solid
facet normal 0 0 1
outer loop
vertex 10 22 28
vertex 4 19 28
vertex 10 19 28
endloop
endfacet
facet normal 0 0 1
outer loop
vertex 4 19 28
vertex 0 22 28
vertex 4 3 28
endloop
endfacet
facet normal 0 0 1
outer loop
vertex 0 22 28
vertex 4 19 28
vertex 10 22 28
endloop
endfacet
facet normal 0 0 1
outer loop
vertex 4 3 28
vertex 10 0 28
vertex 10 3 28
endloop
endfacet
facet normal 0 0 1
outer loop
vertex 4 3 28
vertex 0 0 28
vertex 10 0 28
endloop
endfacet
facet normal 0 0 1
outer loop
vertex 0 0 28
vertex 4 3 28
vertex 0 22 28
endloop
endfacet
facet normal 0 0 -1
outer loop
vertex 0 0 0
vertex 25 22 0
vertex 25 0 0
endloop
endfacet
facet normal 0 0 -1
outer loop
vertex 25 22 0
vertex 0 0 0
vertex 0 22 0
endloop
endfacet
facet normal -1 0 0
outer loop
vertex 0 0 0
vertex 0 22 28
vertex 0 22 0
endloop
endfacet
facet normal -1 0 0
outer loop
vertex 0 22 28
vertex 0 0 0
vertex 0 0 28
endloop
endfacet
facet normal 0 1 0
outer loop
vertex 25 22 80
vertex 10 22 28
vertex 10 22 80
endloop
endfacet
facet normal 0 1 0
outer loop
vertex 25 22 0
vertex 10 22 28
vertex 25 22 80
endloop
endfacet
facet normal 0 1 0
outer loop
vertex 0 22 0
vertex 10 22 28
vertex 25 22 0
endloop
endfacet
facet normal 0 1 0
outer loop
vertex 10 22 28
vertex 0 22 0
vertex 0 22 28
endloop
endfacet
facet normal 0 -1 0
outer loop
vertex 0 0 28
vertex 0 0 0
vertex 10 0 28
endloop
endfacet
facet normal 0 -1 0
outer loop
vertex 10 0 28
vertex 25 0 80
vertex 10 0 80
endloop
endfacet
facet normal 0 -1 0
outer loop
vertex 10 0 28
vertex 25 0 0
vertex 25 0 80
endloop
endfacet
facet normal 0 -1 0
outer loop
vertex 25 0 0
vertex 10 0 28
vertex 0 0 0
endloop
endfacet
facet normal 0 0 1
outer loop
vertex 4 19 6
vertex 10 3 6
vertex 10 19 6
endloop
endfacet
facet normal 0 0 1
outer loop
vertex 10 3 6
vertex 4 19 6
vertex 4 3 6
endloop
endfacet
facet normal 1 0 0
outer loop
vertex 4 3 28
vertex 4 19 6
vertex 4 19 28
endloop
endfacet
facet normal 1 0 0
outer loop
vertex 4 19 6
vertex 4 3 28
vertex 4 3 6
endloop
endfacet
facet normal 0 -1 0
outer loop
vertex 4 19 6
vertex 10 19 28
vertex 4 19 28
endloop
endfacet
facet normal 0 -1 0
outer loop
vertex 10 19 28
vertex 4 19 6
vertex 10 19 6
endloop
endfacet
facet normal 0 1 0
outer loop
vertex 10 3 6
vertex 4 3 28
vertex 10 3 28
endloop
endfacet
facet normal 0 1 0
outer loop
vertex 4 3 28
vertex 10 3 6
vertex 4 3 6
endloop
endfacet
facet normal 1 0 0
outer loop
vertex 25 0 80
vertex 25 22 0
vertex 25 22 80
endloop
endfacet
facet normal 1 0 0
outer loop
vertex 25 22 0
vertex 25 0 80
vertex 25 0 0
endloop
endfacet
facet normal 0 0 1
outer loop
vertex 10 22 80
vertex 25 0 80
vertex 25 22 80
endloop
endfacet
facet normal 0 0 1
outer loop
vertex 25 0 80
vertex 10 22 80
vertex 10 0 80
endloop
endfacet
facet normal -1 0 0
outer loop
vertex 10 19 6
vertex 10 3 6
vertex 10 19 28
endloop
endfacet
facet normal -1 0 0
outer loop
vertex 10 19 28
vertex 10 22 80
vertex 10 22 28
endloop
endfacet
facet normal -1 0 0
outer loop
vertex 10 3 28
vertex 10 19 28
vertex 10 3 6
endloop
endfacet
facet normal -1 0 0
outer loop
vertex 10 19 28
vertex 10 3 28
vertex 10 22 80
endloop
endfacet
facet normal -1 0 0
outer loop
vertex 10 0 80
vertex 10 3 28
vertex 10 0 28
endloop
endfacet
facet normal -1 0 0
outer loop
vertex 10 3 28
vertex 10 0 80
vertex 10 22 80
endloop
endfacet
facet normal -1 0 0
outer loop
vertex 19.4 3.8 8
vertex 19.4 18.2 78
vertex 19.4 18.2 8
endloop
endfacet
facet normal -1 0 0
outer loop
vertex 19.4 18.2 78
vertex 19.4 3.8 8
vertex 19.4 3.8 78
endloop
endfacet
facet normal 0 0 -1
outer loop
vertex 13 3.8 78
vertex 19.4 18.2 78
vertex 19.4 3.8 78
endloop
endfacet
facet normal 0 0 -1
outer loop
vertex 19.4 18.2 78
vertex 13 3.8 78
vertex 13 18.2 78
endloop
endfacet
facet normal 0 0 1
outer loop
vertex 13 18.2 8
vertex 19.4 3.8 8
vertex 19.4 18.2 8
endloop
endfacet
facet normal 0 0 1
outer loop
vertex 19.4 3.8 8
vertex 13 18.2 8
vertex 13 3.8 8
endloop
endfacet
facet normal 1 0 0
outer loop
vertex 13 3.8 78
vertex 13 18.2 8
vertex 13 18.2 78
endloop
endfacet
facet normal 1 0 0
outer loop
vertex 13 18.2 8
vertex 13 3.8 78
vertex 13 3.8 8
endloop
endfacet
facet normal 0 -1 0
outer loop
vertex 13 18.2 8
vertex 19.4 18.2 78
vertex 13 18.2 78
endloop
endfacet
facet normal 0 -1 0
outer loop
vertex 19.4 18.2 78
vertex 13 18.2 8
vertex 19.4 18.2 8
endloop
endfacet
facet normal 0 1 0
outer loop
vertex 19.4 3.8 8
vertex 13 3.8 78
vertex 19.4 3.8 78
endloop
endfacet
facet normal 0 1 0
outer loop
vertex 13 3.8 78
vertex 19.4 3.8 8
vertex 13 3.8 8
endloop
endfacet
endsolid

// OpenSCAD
// file: ../params/mvp_params.scad
// ===================================
// OpenGarden MVP Parameters
// Mechanical Step 3
// Carrier + Insert architecture
// ===================================

// ---------- Pot Insert ----------
insert_top_width        = 168;
insert_top_depth        = 168;
insert_bottom_width     = 144;
insert_bottom_depth     = 144;
insert_height           = 145;

insert_wall_thickness   = 2.4;
insert_bottom_thickness = 3.0;

// Top seating flange
insert_flange_width     = 6;
insert_flange_thickness = 3;

// Real-world fit / tolerance
insert_clearance_xy     = 0.8;   // total opening clearance target
insert_fit_clearance    = 0.4;   // applied to insert outer size to avoid coincident geometry
insert_seat_drop_z      = 0.6;   // seat ledge slightly below flange bottom to avoid coplanar faces

// Drainage
drain_hole_diameter     = 8;
drain_hole_offset_x     = 28;
drain_hole_offset_y     = 0;

// Carrier
carrier_outer_width     = 196;   // 7 x 28
carrier_outer_depth     = 196;   // 7 x 28
carrier_height          = 168;   // 6 x 28

carrier_wall_thickness  = 4;
carrier_back_thickness  = 5;
carrier_ledge_width     = 8;
carrier_ledge_height    = 5;

// Sensor
sensor_probe_width      = 14;
sensor_probe_thickness  = 6;
sensor_probe_length     = 70;

sensor_holder_width     = 22;
sensor_holder_thickness = 3;
sensor_holder_height    = 28;
sensor_insert_depth     = 60;

// Tube
tube_outer_diameter     = 6.0;
tube_clip_wall          = 2.4;
tube_clip_width         = 16;
tube_drop_inset         = 18;

// Electronics
electronics_plate_width  = 110;
electronics_plate_height = 140;
electronics_plate_thick  = 4;

// General print
clearance_loose         = 0.4;
clearance_tight         = 0.2;

$fn = 48;
// main file
include <../params/mvp_params.scad>

// ===================================
// Sensor Holder
// Clip-on insert flange holder
// ===================================

module sensor_channel() {
    cube([
        sensor_probe_thickness + clearance_loose,
        sensor_probe_width + clearance_loose,
        sensor_probe_length
    ], center = false);
}

module flange_clip_body() {
    difference() {
        cube([16, sensor_holder_width, sensor_holder_height], center = false);

        translate([4, 3, 6])
            cube([14, sensor_holder_width - 6, sensor_holder_height], center = false);
    }
}

module sensor_holder_body() {
    difference() {
        cube([
            sensor_holder_thickness + sensor_probe_thickness + 6,
            sensor_holder_width,
            sensor_insert_depth + 20
        ], center = false);

        translate([
            3,
            (sensor_holder_width - (sensor_probe_width + clearance_loose)) / 2,
            8
        ])
        sensor_channel();
    }
}

module sensor_holder() {
    union() {
        flange_clip_body();
        translate([10, 0, 0])
            sensor_holder_body();
    }
}

sensor_holder();
